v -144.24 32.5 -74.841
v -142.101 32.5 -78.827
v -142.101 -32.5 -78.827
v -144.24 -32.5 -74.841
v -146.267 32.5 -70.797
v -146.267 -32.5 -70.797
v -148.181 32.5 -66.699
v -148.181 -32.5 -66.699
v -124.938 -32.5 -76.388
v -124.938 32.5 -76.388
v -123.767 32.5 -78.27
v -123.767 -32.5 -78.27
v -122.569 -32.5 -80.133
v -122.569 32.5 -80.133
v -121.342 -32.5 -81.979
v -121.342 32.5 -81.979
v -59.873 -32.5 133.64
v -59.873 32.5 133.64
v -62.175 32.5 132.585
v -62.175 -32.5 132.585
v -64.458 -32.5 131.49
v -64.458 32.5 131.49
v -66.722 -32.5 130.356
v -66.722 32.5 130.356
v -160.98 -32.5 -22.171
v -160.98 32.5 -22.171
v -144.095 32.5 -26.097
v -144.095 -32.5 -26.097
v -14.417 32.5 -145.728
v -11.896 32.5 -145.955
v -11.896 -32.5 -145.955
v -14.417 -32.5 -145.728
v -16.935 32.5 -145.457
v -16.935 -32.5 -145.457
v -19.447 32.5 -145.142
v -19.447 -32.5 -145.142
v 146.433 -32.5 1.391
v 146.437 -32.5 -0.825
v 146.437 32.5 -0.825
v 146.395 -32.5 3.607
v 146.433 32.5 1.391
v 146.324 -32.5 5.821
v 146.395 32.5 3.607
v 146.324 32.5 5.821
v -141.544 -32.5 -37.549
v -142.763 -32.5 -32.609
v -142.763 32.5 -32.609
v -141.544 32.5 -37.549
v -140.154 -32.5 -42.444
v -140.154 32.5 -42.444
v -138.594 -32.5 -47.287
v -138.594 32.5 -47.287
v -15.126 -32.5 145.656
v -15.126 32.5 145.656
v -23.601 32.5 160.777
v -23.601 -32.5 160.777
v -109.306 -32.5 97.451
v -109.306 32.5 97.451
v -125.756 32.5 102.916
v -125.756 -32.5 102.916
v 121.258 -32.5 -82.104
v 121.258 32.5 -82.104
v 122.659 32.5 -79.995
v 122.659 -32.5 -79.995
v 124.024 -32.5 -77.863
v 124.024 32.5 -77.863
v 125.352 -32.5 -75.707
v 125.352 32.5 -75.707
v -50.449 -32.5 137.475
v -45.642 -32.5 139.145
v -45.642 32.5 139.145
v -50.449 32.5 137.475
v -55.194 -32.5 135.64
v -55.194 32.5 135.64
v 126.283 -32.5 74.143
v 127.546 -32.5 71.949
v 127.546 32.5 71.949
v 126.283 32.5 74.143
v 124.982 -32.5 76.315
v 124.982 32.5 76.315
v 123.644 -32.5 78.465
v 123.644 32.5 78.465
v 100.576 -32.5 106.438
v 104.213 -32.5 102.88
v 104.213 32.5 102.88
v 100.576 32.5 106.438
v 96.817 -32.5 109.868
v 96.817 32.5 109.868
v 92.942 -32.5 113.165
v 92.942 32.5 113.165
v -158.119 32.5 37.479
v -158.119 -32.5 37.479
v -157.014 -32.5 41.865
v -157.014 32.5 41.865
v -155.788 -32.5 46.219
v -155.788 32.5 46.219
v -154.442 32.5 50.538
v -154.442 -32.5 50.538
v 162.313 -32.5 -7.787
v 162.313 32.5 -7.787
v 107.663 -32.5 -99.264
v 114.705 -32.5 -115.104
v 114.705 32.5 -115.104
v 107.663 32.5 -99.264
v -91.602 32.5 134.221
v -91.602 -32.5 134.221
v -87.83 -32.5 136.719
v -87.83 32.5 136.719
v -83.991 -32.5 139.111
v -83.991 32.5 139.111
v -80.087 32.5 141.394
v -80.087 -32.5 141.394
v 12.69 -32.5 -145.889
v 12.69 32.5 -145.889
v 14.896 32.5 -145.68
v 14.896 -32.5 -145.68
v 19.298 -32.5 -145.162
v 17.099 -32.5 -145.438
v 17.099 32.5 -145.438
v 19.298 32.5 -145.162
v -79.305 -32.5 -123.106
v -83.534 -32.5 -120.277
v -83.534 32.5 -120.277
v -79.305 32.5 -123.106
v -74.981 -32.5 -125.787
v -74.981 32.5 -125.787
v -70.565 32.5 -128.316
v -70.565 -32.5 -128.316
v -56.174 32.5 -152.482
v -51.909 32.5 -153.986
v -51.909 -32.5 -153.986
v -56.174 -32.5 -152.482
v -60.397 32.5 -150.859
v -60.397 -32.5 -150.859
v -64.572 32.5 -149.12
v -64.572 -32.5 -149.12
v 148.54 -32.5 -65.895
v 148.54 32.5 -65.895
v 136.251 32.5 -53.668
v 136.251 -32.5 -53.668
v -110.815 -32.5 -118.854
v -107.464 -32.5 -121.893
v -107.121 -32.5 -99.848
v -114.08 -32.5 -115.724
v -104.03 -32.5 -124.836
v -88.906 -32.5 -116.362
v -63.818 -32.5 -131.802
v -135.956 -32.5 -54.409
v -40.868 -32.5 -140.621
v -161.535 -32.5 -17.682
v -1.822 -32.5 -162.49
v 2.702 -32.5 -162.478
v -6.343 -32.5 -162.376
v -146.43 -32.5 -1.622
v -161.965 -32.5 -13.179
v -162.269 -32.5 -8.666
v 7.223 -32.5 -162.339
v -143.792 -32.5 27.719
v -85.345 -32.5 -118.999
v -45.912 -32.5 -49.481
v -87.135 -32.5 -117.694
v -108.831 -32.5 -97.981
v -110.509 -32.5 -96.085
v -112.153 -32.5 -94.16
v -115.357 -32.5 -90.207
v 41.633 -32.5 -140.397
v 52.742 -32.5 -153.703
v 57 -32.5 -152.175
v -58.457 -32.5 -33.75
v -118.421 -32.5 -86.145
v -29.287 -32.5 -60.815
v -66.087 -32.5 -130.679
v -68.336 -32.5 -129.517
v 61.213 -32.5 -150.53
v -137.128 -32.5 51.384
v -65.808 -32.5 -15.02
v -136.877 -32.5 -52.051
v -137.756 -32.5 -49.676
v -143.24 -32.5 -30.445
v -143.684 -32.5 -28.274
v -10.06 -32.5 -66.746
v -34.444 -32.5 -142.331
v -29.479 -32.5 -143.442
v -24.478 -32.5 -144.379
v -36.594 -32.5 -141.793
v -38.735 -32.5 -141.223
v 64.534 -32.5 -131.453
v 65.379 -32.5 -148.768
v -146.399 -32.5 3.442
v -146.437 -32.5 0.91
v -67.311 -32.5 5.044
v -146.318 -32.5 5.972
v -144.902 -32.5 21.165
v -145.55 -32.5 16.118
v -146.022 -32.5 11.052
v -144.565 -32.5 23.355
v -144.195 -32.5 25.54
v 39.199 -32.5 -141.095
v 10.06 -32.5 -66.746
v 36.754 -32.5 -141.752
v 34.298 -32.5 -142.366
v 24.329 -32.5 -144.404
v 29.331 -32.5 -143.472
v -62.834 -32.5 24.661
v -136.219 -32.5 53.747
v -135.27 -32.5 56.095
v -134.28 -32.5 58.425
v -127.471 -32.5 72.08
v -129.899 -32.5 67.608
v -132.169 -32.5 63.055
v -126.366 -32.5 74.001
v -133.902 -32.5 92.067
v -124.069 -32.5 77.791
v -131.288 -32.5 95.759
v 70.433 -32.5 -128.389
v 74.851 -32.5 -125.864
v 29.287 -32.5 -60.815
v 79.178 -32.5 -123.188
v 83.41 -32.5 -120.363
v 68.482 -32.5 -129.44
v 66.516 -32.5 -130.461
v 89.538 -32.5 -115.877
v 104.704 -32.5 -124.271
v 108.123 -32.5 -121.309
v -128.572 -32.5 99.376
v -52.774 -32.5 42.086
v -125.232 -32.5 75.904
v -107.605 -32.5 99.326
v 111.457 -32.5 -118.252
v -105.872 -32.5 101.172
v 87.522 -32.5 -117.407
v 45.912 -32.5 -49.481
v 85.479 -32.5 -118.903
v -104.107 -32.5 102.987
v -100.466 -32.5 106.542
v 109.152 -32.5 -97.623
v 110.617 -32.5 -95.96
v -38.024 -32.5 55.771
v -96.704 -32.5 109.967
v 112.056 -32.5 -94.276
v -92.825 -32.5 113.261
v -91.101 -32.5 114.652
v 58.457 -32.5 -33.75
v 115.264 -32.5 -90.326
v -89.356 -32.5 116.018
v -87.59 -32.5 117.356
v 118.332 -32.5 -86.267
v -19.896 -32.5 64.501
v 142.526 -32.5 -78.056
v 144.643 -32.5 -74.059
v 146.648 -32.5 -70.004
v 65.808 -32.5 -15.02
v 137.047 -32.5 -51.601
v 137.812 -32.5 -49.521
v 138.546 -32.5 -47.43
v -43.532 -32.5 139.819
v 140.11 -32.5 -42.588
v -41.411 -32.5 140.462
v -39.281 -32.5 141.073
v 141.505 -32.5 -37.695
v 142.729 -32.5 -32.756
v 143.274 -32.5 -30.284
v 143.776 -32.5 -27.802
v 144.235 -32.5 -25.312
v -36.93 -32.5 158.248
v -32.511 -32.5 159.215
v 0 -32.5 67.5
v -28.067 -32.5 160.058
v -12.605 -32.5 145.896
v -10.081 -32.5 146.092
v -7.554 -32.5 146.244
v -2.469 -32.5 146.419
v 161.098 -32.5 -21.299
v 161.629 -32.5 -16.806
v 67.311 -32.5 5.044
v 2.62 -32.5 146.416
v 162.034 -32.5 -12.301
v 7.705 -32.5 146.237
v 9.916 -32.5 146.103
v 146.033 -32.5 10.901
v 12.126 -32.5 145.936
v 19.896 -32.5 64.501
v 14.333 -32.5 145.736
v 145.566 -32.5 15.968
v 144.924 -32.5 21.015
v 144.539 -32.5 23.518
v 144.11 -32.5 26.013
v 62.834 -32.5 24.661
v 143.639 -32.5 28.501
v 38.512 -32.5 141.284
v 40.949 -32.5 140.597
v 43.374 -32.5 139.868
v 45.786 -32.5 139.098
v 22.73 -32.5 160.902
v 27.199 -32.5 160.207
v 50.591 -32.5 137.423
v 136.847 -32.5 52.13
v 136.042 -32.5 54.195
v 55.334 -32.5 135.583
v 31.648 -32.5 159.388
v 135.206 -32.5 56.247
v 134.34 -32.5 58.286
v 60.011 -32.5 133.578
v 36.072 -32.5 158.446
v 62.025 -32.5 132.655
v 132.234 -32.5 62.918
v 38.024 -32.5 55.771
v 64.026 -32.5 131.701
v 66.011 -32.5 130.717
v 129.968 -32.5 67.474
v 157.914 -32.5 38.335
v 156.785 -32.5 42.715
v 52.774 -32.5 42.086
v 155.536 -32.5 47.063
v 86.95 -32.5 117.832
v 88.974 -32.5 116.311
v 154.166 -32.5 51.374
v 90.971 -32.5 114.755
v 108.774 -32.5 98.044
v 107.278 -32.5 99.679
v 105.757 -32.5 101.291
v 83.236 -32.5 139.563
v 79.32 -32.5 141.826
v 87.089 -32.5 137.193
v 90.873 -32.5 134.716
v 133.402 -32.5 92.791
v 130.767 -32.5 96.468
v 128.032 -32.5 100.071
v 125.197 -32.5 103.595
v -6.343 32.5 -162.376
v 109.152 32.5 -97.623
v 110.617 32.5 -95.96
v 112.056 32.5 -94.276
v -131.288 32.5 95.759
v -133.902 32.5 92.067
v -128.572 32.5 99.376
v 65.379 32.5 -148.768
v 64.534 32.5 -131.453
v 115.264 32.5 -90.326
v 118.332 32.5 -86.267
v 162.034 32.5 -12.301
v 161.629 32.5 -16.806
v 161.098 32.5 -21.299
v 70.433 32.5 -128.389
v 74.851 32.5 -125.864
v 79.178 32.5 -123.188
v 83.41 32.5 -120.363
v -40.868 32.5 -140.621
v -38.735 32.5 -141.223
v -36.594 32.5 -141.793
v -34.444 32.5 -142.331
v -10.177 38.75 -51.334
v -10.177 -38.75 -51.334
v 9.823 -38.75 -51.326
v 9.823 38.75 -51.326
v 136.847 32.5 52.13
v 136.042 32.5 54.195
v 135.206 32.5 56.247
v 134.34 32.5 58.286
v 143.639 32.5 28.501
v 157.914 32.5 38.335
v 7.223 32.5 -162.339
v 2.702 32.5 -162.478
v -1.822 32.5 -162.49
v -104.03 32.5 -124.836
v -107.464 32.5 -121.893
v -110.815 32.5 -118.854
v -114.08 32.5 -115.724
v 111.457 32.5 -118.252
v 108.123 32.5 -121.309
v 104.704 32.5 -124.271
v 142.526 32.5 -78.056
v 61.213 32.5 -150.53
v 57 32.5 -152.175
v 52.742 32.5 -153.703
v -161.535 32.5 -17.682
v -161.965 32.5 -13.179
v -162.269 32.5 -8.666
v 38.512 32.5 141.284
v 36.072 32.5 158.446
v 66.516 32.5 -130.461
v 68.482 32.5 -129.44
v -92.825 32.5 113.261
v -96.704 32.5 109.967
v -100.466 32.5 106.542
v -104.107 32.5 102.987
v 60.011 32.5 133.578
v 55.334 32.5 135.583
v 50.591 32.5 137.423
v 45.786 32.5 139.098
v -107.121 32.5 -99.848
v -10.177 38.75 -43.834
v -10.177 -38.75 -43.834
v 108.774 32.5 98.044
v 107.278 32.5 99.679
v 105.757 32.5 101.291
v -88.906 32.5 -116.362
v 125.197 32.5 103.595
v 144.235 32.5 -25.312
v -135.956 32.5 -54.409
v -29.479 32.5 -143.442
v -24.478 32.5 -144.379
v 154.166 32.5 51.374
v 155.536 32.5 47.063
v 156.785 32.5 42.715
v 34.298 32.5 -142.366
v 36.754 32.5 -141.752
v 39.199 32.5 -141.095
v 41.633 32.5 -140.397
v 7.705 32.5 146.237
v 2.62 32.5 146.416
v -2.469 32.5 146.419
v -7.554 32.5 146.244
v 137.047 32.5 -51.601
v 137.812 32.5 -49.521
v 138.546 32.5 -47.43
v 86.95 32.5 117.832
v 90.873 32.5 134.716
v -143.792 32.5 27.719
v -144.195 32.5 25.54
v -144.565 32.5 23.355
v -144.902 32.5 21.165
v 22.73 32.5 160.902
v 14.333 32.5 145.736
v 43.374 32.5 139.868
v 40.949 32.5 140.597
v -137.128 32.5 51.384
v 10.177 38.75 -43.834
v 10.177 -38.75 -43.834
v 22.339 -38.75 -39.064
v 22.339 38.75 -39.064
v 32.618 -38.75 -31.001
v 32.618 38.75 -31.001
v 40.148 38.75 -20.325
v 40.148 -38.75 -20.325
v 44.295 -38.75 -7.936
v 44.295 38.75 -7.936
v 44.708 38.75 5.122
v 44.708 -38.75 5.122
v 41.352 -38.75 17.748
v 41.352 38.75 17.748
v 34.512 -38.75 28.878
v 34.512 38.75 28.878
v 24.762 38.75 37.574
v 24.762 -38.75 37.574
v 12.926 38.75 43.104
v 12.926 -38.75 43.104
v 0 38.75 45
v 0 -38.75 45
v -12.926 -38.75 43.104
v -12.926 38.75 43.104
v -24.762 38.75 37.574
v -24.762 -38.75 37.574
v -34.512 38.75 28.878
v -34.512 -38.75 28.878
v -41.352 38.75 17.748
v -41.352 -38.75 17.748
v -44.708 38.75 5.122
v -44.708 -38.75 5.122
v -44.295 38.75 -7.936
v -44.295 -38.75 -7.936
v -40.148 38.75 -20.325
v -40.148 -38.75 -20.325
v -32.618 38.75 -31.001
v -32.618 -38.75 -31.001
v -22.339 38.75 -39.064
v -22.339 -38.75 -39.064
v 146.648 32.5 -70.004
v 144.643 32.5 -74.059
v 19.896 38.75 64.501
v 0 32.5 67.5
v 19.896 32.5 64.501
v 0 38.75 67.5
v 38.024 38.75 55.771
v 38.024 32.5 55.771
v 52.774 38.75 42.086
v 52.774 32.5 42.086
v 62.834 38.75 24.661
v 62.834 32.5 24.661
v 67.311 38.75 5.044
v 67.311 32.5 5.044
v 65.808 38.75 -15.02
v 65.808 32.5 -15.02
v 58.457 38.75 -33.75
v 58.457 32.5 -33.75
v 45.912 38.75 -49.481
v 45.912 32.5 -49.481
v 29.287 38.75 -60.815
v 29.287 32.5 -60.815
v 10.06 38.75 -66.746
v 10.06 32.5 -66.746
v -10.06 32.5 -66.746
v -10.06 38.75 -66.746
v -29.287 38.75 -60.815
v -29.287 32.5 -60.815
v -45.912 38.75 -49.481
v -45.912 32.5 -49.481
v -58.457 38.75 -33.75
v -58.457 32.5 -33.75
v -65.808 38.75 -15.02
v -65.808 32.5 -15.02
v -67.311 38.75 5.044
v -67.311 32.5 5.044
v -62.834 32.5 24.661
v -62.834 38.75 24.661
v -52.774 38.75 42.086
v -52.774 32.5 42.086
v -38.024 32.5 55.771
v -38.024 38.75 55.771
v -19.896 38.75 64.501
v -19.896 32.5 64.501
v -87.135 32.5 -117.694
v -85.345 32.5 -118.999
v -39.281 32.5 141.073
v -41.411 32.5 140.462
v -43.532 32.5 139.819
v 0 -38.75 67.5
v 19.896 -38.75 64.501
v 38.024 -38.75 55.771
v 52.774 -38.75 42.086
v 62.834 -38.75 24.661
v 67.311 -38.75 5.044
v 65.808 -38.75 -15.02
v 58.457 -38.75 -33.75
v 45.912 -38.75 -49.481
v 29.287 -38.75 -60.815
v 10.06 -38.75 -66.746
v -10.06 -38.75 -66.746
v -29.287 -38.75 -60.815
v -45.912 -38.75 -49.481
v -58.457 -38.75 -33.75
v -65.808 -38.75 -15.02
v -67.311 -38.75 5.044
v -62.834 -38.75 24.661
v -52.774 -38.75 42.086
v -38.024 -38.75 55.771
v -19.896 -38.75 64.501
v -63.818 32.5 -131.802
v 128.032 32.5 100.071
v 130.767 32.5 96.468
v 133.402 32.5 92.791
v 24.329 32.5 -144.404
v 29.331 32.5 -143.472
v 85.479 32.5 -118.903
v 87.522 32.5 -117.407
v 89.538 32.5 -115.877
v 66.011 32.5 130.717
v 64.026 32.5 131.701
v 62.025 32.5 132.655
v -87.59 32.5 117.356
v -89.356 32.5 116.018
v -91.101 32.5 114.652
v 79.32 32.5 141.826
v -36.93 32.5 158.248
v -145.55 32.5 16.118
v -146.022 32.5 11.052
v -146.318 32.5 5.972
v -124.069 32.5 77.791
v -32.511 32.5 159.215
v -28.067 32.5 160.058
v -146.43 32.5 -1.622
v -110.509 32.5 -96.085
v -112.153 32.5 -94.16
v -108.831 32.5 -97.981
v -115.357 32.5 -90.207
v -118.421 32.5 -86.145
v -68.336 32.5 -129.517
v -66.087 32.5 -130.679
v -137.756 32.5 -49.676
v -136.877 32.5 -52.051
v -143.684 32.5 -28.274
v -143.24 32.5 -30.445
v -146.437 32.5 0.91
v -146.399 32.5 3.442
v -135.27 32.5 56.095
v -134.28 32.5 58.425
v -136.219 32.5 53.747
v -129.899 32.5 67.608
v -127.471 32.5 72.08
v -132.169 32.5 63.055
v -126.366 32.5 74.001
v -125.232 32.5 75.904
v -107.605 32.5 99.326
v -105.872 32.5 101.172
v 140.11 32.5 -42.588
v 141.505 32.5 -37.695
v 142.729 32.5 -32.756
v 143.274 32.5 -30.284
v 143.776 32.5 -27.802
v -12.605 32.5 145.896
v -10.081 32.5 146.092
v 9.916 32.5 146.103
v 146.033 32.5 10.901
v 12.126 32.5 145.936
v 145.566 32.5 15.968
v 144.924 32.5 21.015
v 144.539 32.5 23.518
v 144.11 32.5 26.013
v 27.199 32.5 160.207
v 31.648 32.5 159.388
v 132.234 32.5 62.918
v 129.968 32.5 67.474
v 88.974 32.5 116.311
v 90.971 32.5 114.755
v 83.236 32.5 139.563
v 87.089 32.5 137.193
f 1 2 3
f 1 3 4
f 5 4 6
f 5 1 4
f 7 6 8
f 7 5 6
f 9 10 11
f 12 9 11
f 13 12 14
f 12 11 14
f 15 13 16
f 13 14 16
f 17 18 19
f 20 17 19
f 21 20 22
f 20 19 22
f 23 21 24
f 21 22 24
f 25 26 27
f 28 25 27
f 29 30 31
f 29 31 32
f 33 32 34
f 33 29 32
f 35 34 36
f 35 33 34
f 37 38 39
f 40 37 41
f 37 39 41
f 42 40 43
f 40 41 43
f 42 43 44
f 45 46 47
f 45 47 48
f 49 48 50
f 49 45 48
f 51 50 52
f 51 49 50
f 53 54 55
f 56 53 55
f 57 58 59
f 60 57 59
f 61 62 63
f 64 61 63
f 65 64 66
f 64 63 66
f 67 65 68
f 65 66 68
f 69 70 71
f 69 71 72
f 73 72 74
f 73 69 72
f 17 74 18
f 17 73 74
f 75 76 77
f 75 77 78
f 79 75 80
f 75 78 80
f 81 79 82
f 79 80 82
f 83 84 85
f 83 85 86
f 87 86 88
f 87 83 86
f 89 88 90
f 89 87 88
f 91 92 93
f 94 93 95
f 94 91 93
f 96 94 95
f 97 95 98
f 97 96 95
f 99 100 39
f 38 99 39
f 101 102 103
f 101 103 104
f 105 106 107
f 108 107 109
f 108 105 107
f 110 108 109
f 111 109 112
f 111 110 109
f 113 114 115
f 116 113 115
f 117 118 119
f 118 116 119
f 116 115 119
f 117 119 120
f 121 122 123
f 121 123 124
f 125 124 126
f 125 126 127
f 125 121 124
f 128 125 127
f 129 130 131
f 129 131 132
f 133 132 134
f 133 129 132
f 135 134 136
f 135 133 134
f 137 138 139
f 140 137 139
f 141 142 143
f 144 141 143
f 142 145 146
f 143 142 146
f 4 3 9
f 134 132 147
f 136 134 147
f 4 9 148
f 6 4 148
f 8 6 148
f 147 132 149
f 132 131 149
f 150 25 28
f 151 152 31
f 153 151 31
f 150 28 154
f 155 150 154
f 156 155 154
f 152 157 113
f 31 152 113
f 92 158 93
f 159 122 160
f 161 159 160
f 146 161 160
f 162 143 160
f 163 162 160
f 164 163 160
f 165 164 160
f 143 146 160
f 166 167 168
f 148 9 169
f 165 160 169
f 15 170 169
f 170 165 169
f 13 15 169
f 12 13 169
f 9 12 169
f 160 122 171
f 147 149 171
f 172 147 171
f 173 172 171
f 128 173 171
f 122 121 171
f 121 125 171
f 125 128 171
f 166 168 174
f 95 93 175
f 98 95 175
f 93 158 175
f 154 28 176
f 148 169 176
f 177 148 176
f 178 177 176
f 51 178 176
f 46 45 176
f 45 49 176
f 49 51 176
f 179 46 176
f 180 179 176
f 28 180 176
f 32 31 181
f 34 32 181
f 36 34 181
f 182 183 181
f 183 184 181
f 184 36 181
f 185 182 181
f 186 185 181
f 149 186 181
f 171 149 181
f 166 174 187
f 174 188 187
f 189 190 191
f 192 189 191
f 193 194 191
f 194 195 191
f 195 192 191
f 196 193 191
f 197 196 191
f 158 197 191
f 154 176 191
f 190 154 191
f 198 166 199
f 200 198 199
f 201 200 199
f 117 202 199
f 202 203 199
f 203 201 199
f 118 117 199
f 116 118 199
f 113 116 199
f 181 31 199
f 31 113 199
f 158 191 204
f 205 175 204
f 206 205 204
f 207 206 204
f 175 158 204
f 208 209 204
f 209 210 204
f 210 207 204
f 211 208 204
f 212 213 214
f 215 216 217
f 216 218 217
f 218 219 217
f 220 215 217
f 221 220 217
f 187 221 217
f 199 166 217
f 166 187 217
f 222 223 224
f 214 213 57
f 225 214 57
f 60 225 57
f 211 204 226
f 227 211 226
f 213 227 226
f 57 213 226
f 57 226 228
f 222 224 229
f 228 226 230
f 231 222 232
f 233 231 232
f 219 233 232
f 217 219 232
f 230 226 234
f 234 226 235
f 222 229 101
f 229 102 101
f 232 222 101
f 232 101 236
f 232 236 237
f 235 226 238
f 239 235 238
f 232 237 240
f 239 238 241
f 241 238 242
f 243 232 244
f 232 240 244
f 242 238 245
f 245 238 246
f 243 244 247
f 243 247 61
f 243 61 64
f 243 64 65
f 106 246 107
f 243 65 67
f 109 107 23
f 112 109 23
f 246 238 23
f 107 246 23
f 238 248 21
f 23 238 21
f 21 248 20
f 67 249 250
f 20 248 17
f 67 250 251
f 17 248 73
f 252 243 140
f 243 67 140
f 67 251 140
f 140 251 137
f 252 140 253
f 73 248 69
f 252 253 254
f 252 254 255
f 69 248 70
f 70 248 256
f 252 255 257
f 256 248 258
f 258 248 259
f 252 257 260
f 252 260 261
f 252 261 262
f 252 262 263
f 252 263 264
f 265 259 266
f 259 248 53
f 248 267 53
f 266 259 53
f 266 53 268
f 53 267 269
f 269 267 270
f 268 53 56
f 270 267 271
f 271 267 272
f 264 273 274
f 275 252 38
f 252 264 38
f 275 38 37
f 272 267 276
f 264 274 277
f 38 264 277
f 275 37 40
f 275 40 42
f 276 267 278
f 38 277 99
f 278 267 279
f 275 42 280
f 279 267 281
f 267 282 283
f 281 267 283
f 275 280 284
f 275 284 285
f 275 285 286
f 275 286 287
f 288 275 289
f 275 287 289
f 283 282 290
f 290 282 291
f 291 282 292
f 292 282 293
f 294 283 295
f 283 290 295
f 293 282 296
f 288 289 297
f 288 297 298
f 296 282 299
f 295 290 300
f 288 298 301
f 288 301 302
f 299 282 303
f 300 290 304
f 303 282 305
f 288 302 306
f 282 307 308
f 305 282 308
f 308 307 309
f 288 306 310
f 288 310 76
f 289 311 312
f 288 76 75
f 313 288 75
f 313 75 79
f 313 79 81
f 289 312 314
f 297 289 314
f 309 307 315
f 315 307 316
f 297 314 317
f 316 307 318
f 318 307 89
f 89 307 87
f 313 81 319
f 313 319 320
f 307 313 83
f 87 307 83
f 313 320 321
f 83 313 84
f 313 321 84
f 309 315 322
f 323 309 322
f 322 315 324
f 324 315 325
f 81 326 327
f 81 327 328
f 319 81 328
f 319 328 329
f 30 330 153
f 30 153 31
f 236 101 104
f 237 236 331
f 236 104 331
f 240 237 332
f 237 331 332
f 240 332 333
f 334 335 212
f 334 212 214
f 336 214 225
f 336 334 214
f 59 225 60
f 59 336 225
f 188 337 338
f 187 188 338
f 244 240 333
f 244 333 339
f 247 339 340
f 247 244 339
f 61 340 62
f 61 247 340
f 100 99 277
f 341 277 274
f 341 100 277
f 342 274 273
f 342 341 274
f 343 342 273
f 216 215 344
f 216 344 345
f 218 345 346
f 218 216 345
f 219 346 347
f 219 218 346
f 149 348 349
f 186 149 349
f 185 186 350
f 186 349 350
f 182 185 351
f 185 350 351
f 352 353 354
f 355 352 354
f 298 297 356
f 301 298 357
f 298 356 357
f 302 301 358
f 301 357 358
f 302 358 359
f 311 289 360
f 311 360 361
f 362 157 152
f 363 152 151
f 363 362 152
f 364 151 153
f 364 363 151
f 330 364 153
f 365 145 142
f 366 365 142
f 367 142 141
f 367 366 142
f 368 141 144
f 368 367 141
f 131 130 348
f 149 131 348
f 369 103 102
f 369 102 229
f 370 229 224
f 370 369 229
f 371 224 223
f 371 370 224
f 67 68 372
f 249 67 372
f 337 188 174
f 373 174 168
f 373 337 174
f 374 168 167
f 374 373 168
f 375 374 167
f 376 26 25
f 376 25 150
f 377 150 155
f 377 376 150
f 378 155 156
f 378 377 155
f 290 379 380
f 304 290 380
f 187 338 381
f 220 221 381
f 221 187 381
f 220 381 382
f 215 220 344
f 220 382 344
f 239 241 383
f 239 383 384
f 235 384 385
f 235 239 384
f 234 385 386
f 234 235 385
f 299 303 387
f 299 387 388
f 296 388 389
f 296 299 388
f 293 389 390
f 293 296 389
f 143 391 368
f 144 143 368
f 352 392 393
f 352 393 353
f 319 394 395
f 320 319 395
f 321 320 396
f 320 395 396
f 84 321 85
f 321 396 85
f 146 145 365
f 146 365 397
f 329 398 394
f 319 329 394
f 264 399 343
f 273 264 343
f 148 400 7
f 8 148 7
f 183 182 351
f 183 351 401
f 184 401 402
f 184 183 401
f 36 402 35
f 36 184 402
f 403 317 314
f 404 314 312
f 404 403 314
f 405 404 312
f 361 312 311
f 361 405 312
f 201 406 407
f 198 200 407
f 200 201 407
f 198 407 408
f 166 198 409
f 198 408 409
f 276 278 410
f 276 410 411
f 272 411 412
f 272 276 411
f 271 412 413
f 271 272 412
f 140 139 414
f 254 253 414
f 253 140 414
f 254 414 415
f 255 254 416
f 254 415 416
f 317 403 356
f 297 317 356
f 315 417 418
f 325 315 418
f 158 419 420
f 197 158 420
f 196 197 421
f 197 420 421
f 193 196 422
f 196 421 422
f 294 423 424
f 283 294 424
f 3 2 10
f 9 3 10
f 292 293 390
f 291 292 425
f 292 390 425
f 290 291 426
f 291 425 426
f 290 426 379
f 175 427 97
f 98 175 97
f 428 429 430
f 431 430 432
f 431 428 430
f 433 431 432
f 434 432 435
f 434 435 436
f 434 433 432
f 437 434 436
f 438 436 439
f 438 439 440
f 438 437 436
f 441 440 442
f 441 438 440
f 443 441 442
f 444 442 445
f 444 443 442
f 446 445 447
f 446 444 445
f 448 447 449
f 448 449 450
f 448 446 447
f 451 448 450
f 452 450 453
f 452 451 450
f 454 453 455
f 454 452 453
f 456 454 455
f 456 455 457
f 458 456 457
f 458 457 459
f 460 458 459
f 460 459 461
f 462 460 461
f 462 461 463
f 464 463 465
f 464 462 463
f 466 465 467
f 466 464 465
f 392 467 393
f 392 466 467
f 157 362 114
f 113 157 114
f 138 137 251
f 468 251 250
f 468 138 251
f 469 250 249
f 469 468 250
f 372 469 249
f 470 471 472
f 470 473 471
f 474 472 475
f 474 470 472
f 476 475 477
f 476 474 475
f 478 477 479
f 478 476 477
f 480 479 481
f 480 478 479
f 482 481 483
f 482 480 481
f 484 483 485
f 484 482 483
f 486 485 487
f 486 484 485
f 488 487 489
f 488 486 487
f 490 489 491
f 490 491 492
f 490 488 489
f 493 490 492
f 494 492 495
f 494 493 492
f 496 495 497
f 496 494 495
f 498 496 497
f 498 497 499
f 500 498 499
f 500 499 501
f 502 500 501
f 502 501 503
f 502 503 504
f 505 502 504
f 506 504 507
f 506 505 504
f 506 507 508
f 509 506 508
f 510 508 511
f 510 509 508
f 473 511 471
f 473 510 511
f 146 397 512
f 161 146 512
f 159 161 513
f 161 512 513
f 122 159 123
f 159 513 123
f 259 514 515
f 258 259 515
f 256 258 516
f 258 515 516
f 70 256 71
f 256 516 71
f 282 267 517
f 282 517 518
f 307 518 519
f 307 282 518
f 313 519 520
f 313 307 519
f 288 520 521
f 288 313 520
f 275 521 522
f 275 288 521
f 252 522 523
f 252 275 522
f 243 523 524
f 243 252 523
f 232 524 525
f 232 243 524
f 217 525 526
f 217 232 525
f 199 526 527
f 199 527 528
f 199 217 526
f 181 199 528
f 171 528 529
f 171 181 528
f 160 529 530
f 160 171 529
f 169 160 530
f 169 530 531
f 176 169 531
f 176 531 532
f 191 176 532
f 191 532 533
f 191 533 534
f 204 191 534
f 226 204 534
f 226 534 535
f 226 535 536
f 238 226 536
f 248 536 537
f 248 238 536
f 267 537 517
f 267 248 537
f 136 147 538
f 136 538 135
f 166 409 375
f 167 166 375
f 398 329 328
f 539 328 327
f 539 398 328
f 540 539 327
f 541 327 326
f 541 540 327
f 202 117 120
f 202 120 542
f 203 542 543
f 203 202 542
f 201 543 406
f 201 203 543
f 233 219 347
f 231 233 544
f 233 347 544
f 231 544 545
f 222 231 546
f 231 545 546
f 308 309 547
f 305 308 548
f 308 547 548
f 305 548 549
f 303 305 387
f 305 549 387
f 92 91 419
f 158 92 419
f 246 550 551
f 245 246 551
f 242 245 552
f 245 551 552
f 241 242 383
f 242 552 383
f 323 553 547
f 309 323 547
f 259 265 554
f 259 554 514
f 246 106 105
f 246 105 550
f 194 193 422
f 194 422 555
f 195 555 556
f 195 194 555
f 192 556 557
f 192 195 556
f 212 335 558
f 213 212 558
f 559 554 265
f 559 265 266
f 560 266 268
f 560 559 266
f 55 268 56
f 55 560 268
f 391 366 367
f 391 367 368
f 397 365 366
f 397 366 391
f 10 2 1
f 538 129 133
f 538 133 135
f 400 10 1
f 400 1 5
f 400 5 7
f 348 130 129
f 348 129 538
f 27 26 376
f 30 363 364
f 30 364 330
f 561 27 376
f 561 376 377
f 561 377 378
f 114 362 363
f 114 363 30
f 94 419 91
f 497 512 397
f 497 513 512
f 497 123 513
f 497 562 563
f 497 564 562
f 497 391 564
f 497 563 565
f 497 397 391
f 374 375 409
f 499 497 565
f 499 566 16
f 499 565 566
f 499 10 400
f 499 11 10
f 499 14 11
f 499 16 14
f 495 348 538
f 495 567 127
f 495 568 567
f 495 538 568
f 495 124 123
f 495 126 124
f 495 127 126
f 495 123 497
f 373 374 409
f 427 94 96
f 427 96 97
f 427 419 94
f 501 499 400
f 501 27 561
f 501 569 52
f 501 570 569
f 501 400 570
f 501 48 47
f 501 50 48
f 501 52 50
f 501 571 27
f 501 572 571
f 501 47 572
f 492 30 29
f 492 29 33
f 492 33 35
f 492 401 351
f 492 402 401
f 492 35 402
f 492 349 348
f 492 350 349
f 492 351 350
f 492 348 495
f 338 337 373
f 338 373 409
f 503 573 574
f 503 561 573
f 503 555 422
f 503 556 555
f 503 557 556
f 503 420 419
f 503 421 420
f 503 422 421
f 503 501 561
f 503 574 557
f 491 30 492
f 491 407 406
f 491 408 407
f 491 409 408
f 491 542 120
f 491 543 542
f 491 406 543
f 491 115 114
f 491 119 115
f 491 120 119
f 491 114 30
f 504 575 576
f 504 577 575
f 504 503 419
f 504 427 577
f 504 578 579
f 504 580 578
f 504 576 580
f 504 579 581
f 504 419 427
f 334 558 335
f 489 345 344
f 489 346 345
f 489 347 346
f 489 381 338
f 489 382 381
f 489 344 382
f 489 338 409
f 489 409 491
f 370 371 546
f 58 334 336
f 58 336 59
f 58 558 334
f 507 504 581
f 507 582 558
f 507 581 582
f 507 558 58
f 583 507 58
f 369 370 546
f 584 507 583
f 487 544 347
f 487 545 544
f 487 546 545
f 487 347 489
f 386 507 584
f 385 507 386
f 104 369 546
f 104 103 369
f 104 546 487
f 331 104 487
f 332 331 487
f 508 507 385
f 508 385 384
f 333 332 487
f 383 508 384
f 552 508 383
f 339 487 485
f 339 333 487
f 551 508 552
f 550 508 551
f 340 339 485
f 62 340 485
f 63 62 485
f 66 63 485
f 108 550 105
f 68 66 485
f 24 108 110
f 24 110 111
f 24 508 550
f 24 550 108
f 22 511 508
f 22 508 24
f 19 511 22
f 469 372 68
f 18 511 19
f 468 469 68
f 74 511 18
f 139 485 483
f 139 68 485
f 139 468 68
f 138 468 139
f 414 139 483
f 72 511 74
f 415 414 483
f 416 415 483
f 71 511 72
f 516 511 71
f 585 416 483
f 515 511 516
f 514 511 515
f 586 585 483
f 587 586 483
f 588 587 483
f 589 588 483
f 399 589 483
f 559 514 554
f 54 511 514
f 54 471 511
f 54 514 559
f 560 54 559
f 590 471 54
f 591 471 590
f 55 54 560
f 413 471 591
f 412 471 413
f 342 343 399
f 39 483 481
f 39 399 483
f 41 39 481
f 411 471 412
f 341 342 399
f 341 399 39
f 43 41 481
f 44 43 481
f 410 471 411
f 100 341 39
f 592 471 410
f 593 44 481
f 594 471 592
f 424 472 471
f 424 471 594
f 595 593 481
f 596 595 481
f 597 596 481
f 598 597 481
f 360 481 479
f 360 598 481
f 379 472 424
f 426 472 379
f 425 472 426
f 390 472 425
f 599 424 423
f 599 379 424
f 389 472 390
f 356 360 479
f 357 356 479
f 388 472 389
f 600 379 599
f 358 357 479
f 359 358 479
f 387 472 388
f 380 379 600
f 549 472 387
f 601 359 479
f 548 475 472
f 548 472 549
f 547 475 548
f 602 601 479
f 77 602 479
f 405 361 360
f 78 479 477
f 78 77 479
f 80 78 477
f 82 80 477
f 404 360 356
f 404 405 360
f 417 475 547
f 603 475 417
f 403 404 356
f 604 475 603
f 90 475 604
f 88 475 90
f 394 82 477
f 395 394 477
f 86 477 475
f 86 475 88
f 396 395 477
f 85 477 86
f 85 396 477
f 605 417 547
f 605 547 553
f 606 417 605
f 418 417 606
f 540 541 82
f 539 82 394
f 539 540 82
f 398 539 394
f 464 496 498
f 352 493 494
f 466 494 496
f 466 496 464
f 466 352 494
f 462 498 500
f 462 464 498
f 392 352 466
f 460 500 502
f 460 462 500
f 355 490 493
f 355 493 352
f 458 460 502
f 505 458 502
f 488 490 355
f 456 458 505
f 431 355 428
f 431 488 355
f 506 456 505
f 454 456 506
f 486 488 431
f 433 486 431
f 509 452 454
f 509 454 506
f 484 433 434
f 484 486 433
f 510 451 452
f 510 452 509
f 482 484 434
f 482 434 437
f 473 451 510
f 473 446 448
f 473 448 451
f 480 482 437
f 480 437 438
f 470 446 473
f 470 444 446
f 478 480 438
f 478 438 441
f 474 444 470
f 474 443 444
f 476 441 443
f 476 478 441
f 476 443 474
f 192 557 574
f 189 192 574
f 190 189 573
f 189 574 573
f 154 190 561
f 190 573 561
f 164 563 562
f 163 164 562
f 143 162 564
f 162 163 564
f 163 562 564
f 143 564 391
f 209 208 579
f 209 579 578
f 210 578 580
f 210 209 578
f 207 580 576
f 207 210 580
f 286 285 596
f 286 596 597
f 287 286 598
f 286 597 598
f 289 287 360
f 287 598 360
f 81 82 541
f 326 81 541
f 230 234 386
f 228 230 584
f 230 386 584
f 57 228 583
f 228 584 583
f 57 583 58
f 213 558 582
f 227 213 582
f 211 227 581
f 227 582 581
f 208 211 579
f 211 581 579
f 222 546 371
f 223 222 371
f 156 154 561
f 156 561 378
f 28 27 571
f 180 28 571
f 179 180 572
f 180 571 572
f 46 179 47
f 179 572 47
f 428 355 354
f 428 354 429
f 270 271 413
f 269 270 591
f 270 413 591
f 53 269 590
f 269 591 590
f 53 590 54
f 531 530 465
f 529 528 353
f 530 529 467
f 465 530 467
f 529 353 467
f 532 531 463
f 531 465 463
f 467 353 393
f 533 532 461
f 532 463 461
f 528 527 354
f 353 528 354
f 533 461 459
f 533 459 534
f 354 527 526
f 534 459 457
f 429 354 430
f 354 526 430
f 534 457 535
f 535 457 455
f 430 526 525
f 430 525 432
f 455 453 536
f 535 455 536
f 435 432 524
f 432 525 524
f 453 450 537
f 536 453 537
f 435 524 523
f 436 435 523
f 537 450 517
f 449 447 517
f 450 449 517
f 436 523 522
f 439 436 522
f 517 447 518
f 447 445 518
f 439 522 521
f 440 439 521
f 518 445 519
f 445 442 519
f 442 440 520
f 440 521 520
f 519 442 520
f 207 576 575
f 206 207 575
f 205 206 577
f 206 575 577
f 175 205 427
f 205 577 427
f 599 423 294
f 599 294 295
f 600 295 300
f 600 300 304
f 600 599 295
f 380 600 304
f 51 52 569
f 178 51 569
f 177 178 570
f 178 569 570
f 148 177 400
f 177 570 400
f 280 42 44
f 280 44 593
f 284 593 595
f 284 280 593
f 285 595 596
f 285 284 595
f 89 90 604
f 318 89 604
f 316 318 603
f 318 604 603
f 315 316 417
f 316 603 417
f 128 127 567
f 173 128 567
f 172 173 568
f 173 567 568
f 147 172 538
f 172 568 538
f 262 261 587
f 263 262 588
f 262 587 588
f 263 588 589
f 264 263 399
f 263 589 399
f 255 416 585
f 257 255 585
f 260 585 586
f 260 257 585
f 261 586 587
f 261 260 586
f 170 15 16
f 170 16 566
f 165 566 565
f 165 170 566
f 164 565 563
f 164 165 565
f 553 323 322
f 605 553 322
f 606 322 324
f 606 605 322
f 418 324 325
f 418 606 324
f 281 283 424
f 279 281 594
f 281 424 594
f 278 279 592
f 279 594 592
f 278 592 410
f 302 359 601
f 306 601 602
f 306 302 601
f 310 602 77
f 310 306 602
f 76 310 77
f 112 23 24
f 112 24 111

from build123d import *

# Parameters (mm, degrees)
SKETCH3_R           = 165
BOSS_EXTRUDE1_DEPTH = 32.5
SKETCH5_R           = 67.5
BOSS_EXTRUDE2_DEPTH = 38.75
CUT_EXTRUDE1_DEPTH  = 77.5
CUT_EXTRUDE2_START  = -65
CUT_EXTRUDE2_DEPTH  = 65
CUT_EXTRUDE4_DEPTH  = 244.931170023
SKETCH10_R          = 165
SKETCH10_R_2        = 162.5
CUT_EXTRUDE5_DEPTH  = 244.819721335


# Read off the part's stored shape, not the designer's step: Cut-Extrude2
with BuildPart() as part:
    # Sketch3 → Boss-Extrude1 (new, symmetric)
    with BuildSketch(Plane(origin=(0, 0, 0), x_dir=(1, 0, 0), z_dir=(0, 1, 0))):
        with Locations(Location((0, 0, 0), (0, 0, 270))):
            Circle(SKETCH3_R)
    extrude(amount=BOSS_EXTRUDE1_DEPTH, both=True)

    # Sketch5 → Boss-Extrude2 (add, symmetric)
    with BuildSketch(Plane(origin=(0, 0, 0), x_dir=(1, 0, 0), z_dir=(0, 1, 0))):
        with Locations(Location((0, 0, 0), (0, 0, 270))):
            Circle(SKETCH5_R)
    extrude(amount=BOSS_EXTRUDE2_DEPTH, both=True)

    # Sketch6 → Cut-Extrude1 (cut)
    with BuildSketch(Plane(origin=(0, 38.75, 0), x_dir=(1, 0, 0), z_dir=(0, 1, 0))):
        with BuildLine():
            Line((-10.176530617, 43.834212946), (-10.176530617, 51.334212946))
            Line((-10.176530617, 51.334212946), (9.823467655, 51.325898107))
            Line((9.823467655, 51.325898107), (10.176530617, 43.834212946))
            ThreePointArc((10.176530617, 43.834212946), (0, -45), (-10.176530617, 43.834212946))
        make_face()
    extrude(amount=-CUT_EXTRUDE1_DEPTH, mode=Mode.SUBTRACT)

    # Cut-Extrude2 outline → Cut-Extrude2 (cut)
    with BuildSketch(Plane(origin=(0, 32.5, 0), x_dir=(1, 0, 0), z_dir=(0, 1, 0)).offset(CUT_EXTRUDE2_START)):
        with BuildLine():
            ThreePointArc((-144.901893855, -21.164686614), (-145.807749666, -13.586866441), (-146.317587116, -5.972143919))
            Line((-146.317587116, -5.972143919), (-164.906164085, 5.563905713))
            ThreePointArc((-164.906164085, 5.563905713), (-164.325820919, -14.900489227), (-161.215685462, -35.135491472))
            Line((-161.215685462, -35.135491472), (-144.901893855, -21.164686614))
        make_face()
        with BuildLine():
            ThreePointArc((-151.760503896, 64.759165043), (-158.611942136, 45.467040938), (-163.021553119, 25.474952768))
            Line((-163.021553119, 25.474952768), (-142.762558665, 32.609119058))
            ThreePointArc((-142.762558665, 32.609119058), (-140.869819667, 40.002458791), (-138.594473879, 47.287150608))
            Line((-138.594473879, 47.287150608), (-151.760503896, 64.759165043))
        make_face()
        with BuildLine():
            Line((-134.279699439, -58.424867317), (-155.780333037, -54.382789914))
            ThreePointArc((-155.780333037, -54.382789914), (-147.846587026, -73.255625755), (-137.636746156, -91.000692896))
            Line((-137.636746156, -91.000692896), (-127.471425351, -72.080084082))
            ThreePointArc((-127.471425351, -72.080084082), (-131.053535124, -65.341210074), (-134.279699439, -58.424867317))
        make_face()
        with BuildLine():
            ThreePointArc((-118.118746723, 115.208340291), (-131.476641669, 99.693995283), (-142.810456694, 82.644863475))
            Line((-142.810456694, 82.644863475), (-121.342348853, 81.978882508))
            ThreePointArc((-121.342348853, 81.978882508), (-116.906639936, 88.189230302), (-112.153408966, 94.160053418))
            Line((-112.153408966, 94.160053418), (-118.118746723, 115.208340291))
        make_face()
        with BuildLine():
            Line((-104.106594283, -102.98698864), (-125.615504804, -106.984788418))
            ThreePointArc((-125.615504804, -106.984788418), (-111.399852309, -121.717184101), (-95.46920161, -134.575746492))
            Line((-95.46920161, -134.575746492), (-92.82523451, -113.260666785))
            ThreePointArc((-92.82523451, -113.260666785), (-98.59981447, -108.270861218), (-104.106594283, -102.98698864))
        make_face()
        with BuildLine():
            ThreePointArc((-68.524398286, 150.097990791), (-86.584692207, 140.45672314), (-103.312016753, 128.653127418))
            Line((-103.312016753, 128.653127418), (-83.534182446, 120.276943615))
            ThreePointArc((-83.534182446, 120.276943615), (-77.154570678, 124.465557588), (-70.565404709, 128.316119255))
            Line((-70.565404709, 128.316119255), (-68.524398286, 150.097990791))
        make_face()
        with BuildLine():
            Line((-59.873316695, -133.640146477), (-78.485606588, -145.137898423))
            ThreePointArc((-78.485606588, -145.137898423), (-59.90795025, -153.740162277), (-40.408012374, -159.975599814))
            Line((-40.408012374, -159.975599814), (-45.642481386, -139.144768839))
            ThreePointArc((-45.642481386, -139.144768839), (-52.829642513, -136.577932604), (-59.873316695, -133.640146477))
        make_face()
        with BuildLine():
            ThreePointArc((-9.675450153, 164.716075913), (-29.99900028, 162.249992241), (-49.860716477, 157.286073612))
            Line((-49.860716477, 157.286073612), (-34.444261822, 142.330937009))
            ThreePointArc((-34.444261822, 142.330937009), (-26.982349124, 143.932121634), (-19.44715153, 145.142382162))
            Line((-19.44715153, 145.142382162), (-9.675450153, 164.716075913))
        make_face()
        with BuildLine():
            Line((-7.553815918, -146.244462006), (-20.755792298, -163.689331009))
            ThreePointArc((-20.755792298, -163.689331009), (-0.325147548, -164.999679633), (20.110502842, -163.769861927))
            Line((20.110502842, -163.769861927), (7.704541763, -146.236598834))
            ThreePointArc((7.704541763, -146.236598834), (0.075465406, -146.439397388), (-7.553815918, -146.244462006))
        make_face()
        with BuildLine():
            ThreePointArc((50.480221136, 157.08834226), (30.638222865, 162.130500831), (10.324549847, 164.676664013))
            Line((10.324549847, 164.676664013), (19.297547224, 145.162348677))
            ThreePointArc((19.297547224, 145.162348677), (26.833988195, 143.959855098), (34.297547224, 142.366362097))
            Line((34.297547224, 142.366362097), (50.480221136, 157.08834226))
        make_face()
        with BuildLine():
            Line((45.785869556, -139.097652573), (39.777206754, -160.133612408))
            ThreePointArc((39.777206754, -160.133612408), (59.301568133, -153.97507596), (77.912983213, -145.446096705))
            Line((77.912983213, -145.446096705), (60.011023855, -133.578365832))
            ThreePointArc((60.011023855, -133.578365832), (52.970381303, -136.523410106), (45.785869556, -139.097652573))
        make_face()
        with BuildLine():
            ThreePointArc((103.81825884, 128.244957528), (87.13758424, 140.114386888), (69.115428503, 149.826758434))
            Line((69.115428503, 149.826758434), (70.433115586, 128.388780784))
            ThreePointArc((70.433115586, 128.388780784), (77.026246716, 124.545012422), (83.410172176, 120.362975952))
            Line((83.410172176, 120.362975952), (103.81825884, 128.244957528))
        make_face()
        with BuildLine():
            Line((92.941919639, -113.164934393), (94.93807362, -134.950962121))
            ThreePointArc((94.93807362, -134.950962121), (110.919278435, -122.155285074), (125.192883471, -107.479030179))
            Line((125.192883471, -107.479030179), (104.212684643, -102.87963434))
            ThreePointArc((104.212684643, -102.87963434), (98.711353687, -108.169179786), (92.941919639, -113.164934393))
        make_face()
        with BuildLine():
            ThreePointArc((143.135065411, 82.081380652), (131.868532017, 99.175048594), (118.571885559, 114.741918909))
            Line((118.571885559, 114.741918909), (112.056301405, 94.275596619))
            ThreePointArc((112.056301405, 94.275596619), (116.815683801, 88.309675691), (121.257791184, 82.103902949))
            Line((121.257791184, 82.103902949), (143.135065411, 82.081380652))
        make_face()
        with BuildLine():
            Line((127.545648465, -71.948664755), (137.277027574, -91.54243661))
            ThreePointArc((137.277027574, -91.54243661), (147.55672556, -73.837746052), (155.564791098, -54.996325066))
            Line((155.564791098, -54.996325066), (134.339844907, -58.286438155))
            ThreePointArc((134.339844907, -58.286438155), (131.120810776, -65.206102351), (127.545648465, -71.948664755))
        make_face()
        with BuildLine():
            ThreePointArc((163.12068826, 24.83225849), (158.789903837, 44.84157044), (152.01455244, 64.160547429))
            Line((152.01455244, 64.160547429), (138.545662793, 47.429970732))
            ThreePointArc((138.545662793, 47.429970732), (140.82851549, 40.147627916), (142.72887358, 32.756242901))
            Line((142.72887358, 32.756242901), (163.12068826, 24.83225849))
        make_face()
        with BuildLine():
            Line((144.923630711, -21.015329261), (161.075958276, -35.770597781))
            ThreePointArc((161.075958276, -35.770597781), (164.265819258, -15.548010277), (164.926811673, 4.913938493))
            Line((164.926811673, 4.913938493), (146.323664713, -5.821335521))
            ThreePointArc((146.323664713, -5.821335521), (145.821675804, -13.436579474), (144.923630711, -21.015329261))
        make_face()
    extrude(amount=CUT_EXTRUDE2_DEPTH, mode=Mode.SUBTRACT)

    # Sketch9 → Cut-Extrude4 (cut, through all)
    with BuildSketch(Plane(origin=(0, 32.5, 0), x_dir=(1, 0, 0), z_dir=(0, 1, 0))):
        with BuildLine():
            Line((-5.487093592, 164.908737803), (-11.895777239, 145.955449663))
            ThreePointArc((-11.895777239, 145.955449663), (-15.676736447, 145.597880262), (-19.44715153, 145.142382162))
            Line((-19.44715153, 145.142382162), (-20.251209919, 147.961121018))
            Line((-20.251209919, 147.961121018), (-10.203781376, 165.845543824))
            Line((-10.203781376, 165.845543824), (-5.487093592, 164.908737803))
        make_face()
        with BuildLine():
            Line((6.379749343, 164.876616894), (12.690126804, 145.888531023))
            ThreePointArc((12.690126804, 145.888531023), (15.997957921, 145.56293534), (19.297547224, 145.162348677))
            Line((19.297547224, 145.162348677), (21.04372139, 145.888531023))
            Line((21.04372139, 145.888531023), (10.594395706, 165.845543824))
            Line((10.594395706, 165.845543824), (6.379749343, 164.876616894))
        make_face()
        with BuildLine():
            Line((34.566031027, 145.285217195), (34.297547224, 142.366362097))
            ThreePointArc((34.297547224, 142.366362097), (37.977899474, 141.429070399), (41.632707903, 140.396653931))
            Line((41.632707903, 140.396653931), (54.455344819, 155.754985219))
            Line((54.455344819, 155.754985219), (50.395577812, 158.332394972))
            Line((50.395577812, 158.332394972), (34.566031027, 145.285217195))
        make_face()
        with BuildLine():
            Line((65.509242895, 151.438235249), (64.534206856, 131.452801217))
            ThreePointArc((64.534206856, 131.452801217), (67.501048785, 129.95426586), (70.433115586, 128.388780784))
            Line((70.433115586, 128.388780784), (72.323701824, 128.43513479))
            Line((72.323701824, 128.43513479), (69.789300364, 150.819226829))
            Line((69.789300364, 150.819226829), (65.509242895, 151.438235249))
        make_face()
        with BuildLine():
            Line((84.714937945, 122.987739735), (83.410172176, 120.362975952))
            ThreePointArc((83.410172176, 120.362975952), (86.503409629, 118.159480893), (89.538465148, 115.876512121))
            Line((89.538465148, 115.876512121), (107.043287164, 125.565658813))
            Line((107.043287164, 125.565658813), (104.188734966, 129.435578829))
            Line((104.188734966, 129.435578829), (84.714937945, 122.987739735))
        make_face()
        with BuildLine():
            Line((115.791350195, 117.547280786), (107.662584677, 99.263642201))
            ThreePointArc((107.662584677, 99.263642201), (109.887748975, 96.794552675), (112.056301405, 94.275596619))
            Line((112.056301405, 94.275596619), (113.835965567, 93.635861919))
            Line((113.835965567, 93.635861919), (119.558773292, 115.423937533))
            Line((119.558773292, 115.423937533), (115.791350195, 117.547280786))
        make_face()
        with BuildLine():
            Line((123.422623072, 84.080086526), (121.257791184, 82.103902949))
            ThreePointArc((121.257791184, 82.103902949), (123.346154982, 78.931798748), (125.351556524, 75.706605255))
            Line((125.351556524, 75.706605255), (145.17444043, 78.417994401))
            Line((145.17444043, 78.417994401), (143.910626133, 83.057770538))
            Line((143.910626133, 83.057770538), (123.422623072, 84.080086526))
        make_face()
        with BuildLine():
            Line((150.435194029, 67.7809147), (136.250533858, 53.668378268))
            ThreePointArc((136.250533858, 53.668378268), (137.433499757, 50.562198793), (138.545662793, 47.429970732))
            Line((138.545662793, 47.429970732), (139.974051374, 46.190547043))
            Line((139.974051374, 46.190547043), (153.181171389, 64.440005886))
            Line((153.181171389, 64.440005886), (150.435194029, 67.7809147))
        make_face()
        with BuildLine():
            Line((145.461399045, 33.816951728), (142.72887358, 32.756242901))
            ThreePointArc((142.72887358, 32.756242901), (143.530318619, 29.043939806), (144.235225595, 25.312101845))
            Line((144.235225595, 25.312101845), (163.698981077, 20.679545316))
            Line((163.698981077, 20.679545316), (164.196589804, 25.462550097))
            Line((164.196589804, 25.462550097), (145.461399045, 33.816951728))
        make_face()
        with BuildLine():
            Line((164.761931319, 8.860360497), (146.437093451, 0.824902462))
            ThreePointArc((146.437093451, 0.824902462), (146.418094852, -2.49886021), (146.323664713, -5.821335521))
            Line((146.323664713, -5.821335521), (147.207865919, -7.493057163))
            Line((147.207865919, -7.493057163), (166.115603483, 4.753094371))
            Line((166.115603483, 4.753094371), (164.761931319, 8.860360497))
        make_face()
        with BuildLine():
            Line((147.854807047, -21.013349787), (144.923630711, -21.015329261))
            ThreePointArc((144.923630711, -21.015329261), (144.329917398, -24.766464144), (143.639128215, -28.500941179))
            Line((143.639128215, -28.500941179), (160.115067242, -39.851790953))
            Line((160.115067242, -39.851790953), (162.306894177, -35.571528828))
            Line((162.306894177, -35.571528828), (147.854807047, -21.013349787))
        make_face()
        with BuildLine():
            Line((156.836656807, -51.256834487), (136.846512137, -52.129980992))
            ThreePointArc((136.846512137, -52.129980992), (135.628114906, -55.222434295), (134.339844907, -58.286438155))
            Line((134.339844907, -58.286438155), (134.560442465, -60.164682478))
            Line((134.560442465, -60.164682478), (156.615202849, -55.575748877))
            Line((156.615202849, -55.575748877), (156.836656807, -51.256834487))
        make_face()
        with BuildLine():
            Line((130.279604066, -73.005681975), (127.545648465, -71.948664755))
            ThreePointArc((127.545648465, -71.948664755), (125.636961073, -75.232019877), (123.643770637, -78.464774167))
            Line((123.643770637, -78.464774167), (134.906726347, -95.000922028))
            Line((134.906726347, -95.000922028), (138.496753118, -91.801475676))
            Line((138.496753118, -91.801475676), (130.279604066, -73.005681975))
        make_face()
        with BuildLine():
            Line((127.729722731, -104.451509951), (108.774051067, -98.044421651))
            ThreePointArc((108.774051067, -98.044421651), (106.5208065, -100.487912631), (104.212684643, -102.87963434))
            Line((104.212684643, -102.87963434), (103.739885631, -104.710734041))
            Line((103.739885631, -104.710734041), (125.963051235, -108.398779284))
            Line((125.963051235, -108.398779284), (127.729722731, -104.451509951))
        make_face()
        with BuildLine():
            Line((95.109418652, -115.138192273), (92.941919639, -113.164934393))
            ThreePointArc((92.941919639, -113.164934393), (89.976036976, -115.53707445), (86.949636701, -117.831504616))
            Line((86.949636701, -117.831504616), (91.478484516, -137.319652165))
            Line((91.478484516, -137.319652165), (95.981858114, -135.633124544))
            Line((95.981858114, -135.633124544), (95.109418652, -115.138192273))
        make_face()
        with BuildLine():
            Line((81.372181826, -143.539430209), (66.011051662, -130.717419883))
            ThreePointArc((66.011051662, -130.717419883), (63.027272925, -132.181941543), (60.011023855, -133.578365832))
            Line((60.011023855, -133.578365832), (58.9086824, -135.115020749))
            Line((58.9086824, -135.115020749), (78.298891566, -146.58195389))
            Line((78.298891566, -146.58195389), (81.372181826, -143.539430209))
        make_face()
        with BuildLine():
            Line((47.094179229, -141.720651702), (45.785869556, -139.097652573))
            ThreePointArc((45.785869556, -139.097652573), (42.163350512, -140.238206905), (38.512472524, -141.284437439))
            Line((38.512472524, -141.284437439), (35.695566451, -161.092602362))
            Line((35.695566451, -161.092602362), (40.504081318, -161.146768373))
            Line((40.504081318, -161.146768373), (47.094179229, -141.720651702))
        make_face()
        with BuildLine():
            Line((24.024876866, -163.241555039), (14.332893951, -145.736306229))
            ThreePointArc((14.332893951, -145.736306229), (11.021556895, -146.024066804), (7.704541763, -146.236598834))
            Line((7.704541763, -146.236598834), (6.121535186, -147.271275207))
            Line((6.121535186, -147.271275207), (20.060032723, -164.968423384))
            Line((20.060032723, -164.968423384), (24.024876866, -163.241555039))
        make_face()
        with BuildLine():
            Line((-7.281390057, -149.162951818), (-7.553815918, -146.244462006))
            ThreePointArc((-7.553815918, -146.244462006), (-11.343730075, -145.999392431), (-15.126014473, -145.656124102))
            Line((-15.126014473, -145.656124102), (-24.908235659, -163.109103965))
            Line((-24.908235659, -163.109103965), (-20.443996102, -164.896648189))
            Line((-20.443996102, -164.896648189), (-7.281390057, -149.162951818))
        make_face()
        with BuildLine():
            Line((-36.56712084, -160.897003308), (-39.28100051, -141.072696867))
            ThreePointArc((-39.28100051, -141.072696867), (-42.472681466, -140.144832696), (-45.642481386, -139.144768839))
            Line((-45.642481386, -139.144768839), (-47.492359274, -139.53772789))
            Line((-47.492359274, -139.53772789), (-40.888044696, -161.074993179))
            Line((-40.888044696, -161.074993179), (-36.56712084, -160.897003308))
        make_face()
        with BuildLine():
            Line((-60.673567267, -136.45996875), (-59.873316695, -133.640146477))
            ThreePointArc((-59.873316695, -133.640146477), (-63.318777057, -132.042550999), (-66.721649399, -130.356144097))
            Line((-66.721649399, -130.356144097), (-82.148042522, -143.096817259))
            Line((-82.148042522, -143.096817259), (-78.630998563, -146.376321943))
            Line((-78.630998563, -146.376321943), (-60.673567267, -136.45996875))
        make_face()
        with BuildLine():
            Line((-92.220526252, -136.822419719), (-87.589778189, -117.356438082))
            ThreePointArc((-87.589778189, -117.356438082), (-90.230748846, -115.338262363), (-92.82523451, -113.260666785))
            Line((-92.82523451, -113.260666785), (-94.692147451, -112.958837216))
            Line((-94.692147451, -112.958837216), (-96.313965111, -135.427492597))
            Line((-96.313965111, -135.427492597), (-92.220526252, -136.822419719))
        make_face()
        with BuildLine():
            Line((-105.871443015, -105.327310752), (-104.106594283, -102.98698864))
            ThreePointArc((-104.106594283, -102.98698864), (-106.742272336, -100.252631382), (-109.306155856, -97.450844503))
            Line((-109.306155856, -97.450844503), (-128.293301045, -103.758512456))
            Line((-128.293301045, -103.758512456), (-126.19844896, -108.087062319))
            Line((-126.19844896, -108.087062319), (-105.871443015, -105.327310752))
        make_face()
        with BuildLine():
            Line((-135.419038582, -94.269210188), (-124.069070971, -77.790542039))
            ThreePointArc((-124.069070971, -77.790542039), (-125.802653609, -74.954620587), (-127.471425351, -72.080084082))
            Line((-127.471425351, -72.080084082), (-129.103236407, -71.124229649))
            Line((-129.103236407, -71.124229649), (-138.732150843, -91.489758711))
            Line((-138.732150843, -91.489758711), (-135.419038582, -94.269210188))
        make_face()
        with BuildLine():
            Line((-136.770793729, -59.969615797), (-134.279699439, -58.424867317))
            ThreePointArc((-134.279699439, -58.424867317), (-135.749632257, -54.923038377), (-137.128260278, -51.384268366))
            Line((-137.128260278, -51.384268366), (-157.111838364, -50.407045599))
            Line((-157.111838364, -50.407045599), (-156.722099534, -55.200045998))
            Line((-156.722099534, -55.200045998), (-136.770793729, -59.969615797))
        make_face()
        with BuildLine():
            Line((-160.328459369, -38.984421457), (-143.792148228, -27.718602242))
            ThreePointArc((-143.792148228, -27.718602242), (-144.384212905, -24.447941962), (-144.901893855, -21.164686614))
            Line((-144.901893855, -21.164686614), (-146.078217901, -19.683900756))
            Line((-146.078217901, -19.683900756), (-162.413790863, -35.195825949))
            Line((-162.413790863, -35.195825949), (-160.328459369, -38.984421457))
        make_face()
        with BuildLine():
            Line((-149.198490877, -6.512691927), (-146.317587116, -5.972143919))
            ThreePointArc((-146.317587116, -5.972143919), (-146.423252127, -2.1757847), (-146.430433296, 1.622037945))
            Line((-146.430433296, 1.622037945), (-164.711551324, 9.752172081))
            Line((-164.711551324, 9.752172081), (-166.07956214, 5.142042409))
            Line((-166.07956214, 5.142042409), (-149.198490877, -6.512691927))
        make_face()
        with BuildLine():
            Line((-163.584633307, 21.565429412), (-144.095299088, 26.096888382))
            ThreePointArc((-144.095299088, 26.096888382), (-143.465884188, 29.360566695), (-142.762558665, 32.609119058))
            Line((-142.762558665, 32.609119058), (-143.324526619, 34.414848007))
            Line((-143.324526619, 34.414848007), (-164.16054846, 25.851498135))
            Line((-164.16054846, 25.851498135), (-163.584633307, 21.565429412))
        make_face()
        with BuildLine():
            Line((-141.476105095, 47.823807077), (-138.594473879, 47.287150608))
            ThreePointArc((-138.594473879, 47.287150608), (-137.321600437, 50.865320757), (-135.956364898, 54.409279043))
            Line((-135.956364898, 54.409279043), (-150.066056581, 68.594304882))
            Line((-150.066056581, 68.594304882), (-153.007059599, 64.789669496))
            Line((-153.007059599, 64.789669496), (-141.476105095, 47.823807077))
        make_face()
        with BuildLine():
            Line((-144.747796064, 79.20274954), (-124.937581346, 76.387849622))
            ThreePointArc((-124.937581346, 76.387849622), (-123.171692839, 79.203768127), (-121.342348853, 81.978882508))
            Line((-121.342348853, 81.978882508), (-121.21406383, 83.865680847))
            Line((-121.21406383, 83.865680847), (-143.736514343, 83.407434147))
            Line((-143.736514343, 83.407434147), (-144.747796064, 79.20274954))
        make_face()
        with BuildLine():
            Line((-114.646587374, 95.701435934), (-112.153408966, 94.160053418))
            ThreePointArc((-112.153408966, 94.160053418), (-109.673905684, 97.036782791), (-107.120636061, 99.848245514))
            Line((-107.120636061, 99.848245514), (-115.153309351, 118.172396715))
            Line((-115.153309351, 118.172396715), (-119.270105819, 115.687092705))
            Line((-119.270105819, 115.687092705), (-114.646587374, 95.701435934))
        make_face()
        with BuildLine():
            Line((-106.361966886, 126.143299466), (-88.90635094, 116.362208491))
            ThreePointArc((-88.90635094, 116.362208491), (-86.242481854, 118.350061791), (-83.534182446, 120.276943615))
            Line((-83.534182446, 120.276943615), (-82.732970049, 121.989988773))
            Line((-82.732970049, 121.989988773), (-103.900067493, 129.698734002))
            Line((-103.900067493, 129.698734002), (-106.361966886, 126.143299466))
        make_face()
        with BuildLine():
            Line((-72.333412749, 130.654055568), (-70.565404709, 128.316119255))
            ThreePointArc((-70.565404709, 128.316119255), (-67.214142244, 130.10288961), (-63.817671747, 131.802153151))
            Line((-63.817671747, 131.802153151), (-64.688469607, 151.790651556))
            Line((-64.688469607, 151.790651556), (-69.425063349, 150.960333))
            Line((-69.425063349, 150.960333), (-72.333412749, 130.654055568))
        make_face()
        with BuildLine():
            Line((-53.611364709, 156.047497814), (-40.867825192, 140.621206318))
            ThreePointArc((-40.867825192, 140.621206318), (-37.665745809, 141.51252381), (-34.444261822, 142.330937009))
            Line((-34.444261822, 142.330937009), (-33.078330224, 143.638872746))
            Line((-33.078330224, 143.638872746), (-50.031340797, 158.473501143))
            Line((-50.031340797, 158.473501143), (-53.611364709, 156.047497814))
        make_face()
    extrude(amount=-CUT_EXTRUDE4_DEPTH, mode=Mode.SUBTRACT)

    # Sketch10 → Cut-Extrude5 (cut, through all)
    with BuildSketch(Plane(origin=(0, 32.5, 0), x_dir=(1, 0, 0), z_dir=(0, 1, 0))):
        Circle(SKETCH10_R)
        Circle(SKETCH10_R_2, mode=Mode.SUBTRACT)
    extrude(amount=-CUT_EXTRUDE5_DEPTH, mode=Mode.SUBTRACT)


solid = part.part
